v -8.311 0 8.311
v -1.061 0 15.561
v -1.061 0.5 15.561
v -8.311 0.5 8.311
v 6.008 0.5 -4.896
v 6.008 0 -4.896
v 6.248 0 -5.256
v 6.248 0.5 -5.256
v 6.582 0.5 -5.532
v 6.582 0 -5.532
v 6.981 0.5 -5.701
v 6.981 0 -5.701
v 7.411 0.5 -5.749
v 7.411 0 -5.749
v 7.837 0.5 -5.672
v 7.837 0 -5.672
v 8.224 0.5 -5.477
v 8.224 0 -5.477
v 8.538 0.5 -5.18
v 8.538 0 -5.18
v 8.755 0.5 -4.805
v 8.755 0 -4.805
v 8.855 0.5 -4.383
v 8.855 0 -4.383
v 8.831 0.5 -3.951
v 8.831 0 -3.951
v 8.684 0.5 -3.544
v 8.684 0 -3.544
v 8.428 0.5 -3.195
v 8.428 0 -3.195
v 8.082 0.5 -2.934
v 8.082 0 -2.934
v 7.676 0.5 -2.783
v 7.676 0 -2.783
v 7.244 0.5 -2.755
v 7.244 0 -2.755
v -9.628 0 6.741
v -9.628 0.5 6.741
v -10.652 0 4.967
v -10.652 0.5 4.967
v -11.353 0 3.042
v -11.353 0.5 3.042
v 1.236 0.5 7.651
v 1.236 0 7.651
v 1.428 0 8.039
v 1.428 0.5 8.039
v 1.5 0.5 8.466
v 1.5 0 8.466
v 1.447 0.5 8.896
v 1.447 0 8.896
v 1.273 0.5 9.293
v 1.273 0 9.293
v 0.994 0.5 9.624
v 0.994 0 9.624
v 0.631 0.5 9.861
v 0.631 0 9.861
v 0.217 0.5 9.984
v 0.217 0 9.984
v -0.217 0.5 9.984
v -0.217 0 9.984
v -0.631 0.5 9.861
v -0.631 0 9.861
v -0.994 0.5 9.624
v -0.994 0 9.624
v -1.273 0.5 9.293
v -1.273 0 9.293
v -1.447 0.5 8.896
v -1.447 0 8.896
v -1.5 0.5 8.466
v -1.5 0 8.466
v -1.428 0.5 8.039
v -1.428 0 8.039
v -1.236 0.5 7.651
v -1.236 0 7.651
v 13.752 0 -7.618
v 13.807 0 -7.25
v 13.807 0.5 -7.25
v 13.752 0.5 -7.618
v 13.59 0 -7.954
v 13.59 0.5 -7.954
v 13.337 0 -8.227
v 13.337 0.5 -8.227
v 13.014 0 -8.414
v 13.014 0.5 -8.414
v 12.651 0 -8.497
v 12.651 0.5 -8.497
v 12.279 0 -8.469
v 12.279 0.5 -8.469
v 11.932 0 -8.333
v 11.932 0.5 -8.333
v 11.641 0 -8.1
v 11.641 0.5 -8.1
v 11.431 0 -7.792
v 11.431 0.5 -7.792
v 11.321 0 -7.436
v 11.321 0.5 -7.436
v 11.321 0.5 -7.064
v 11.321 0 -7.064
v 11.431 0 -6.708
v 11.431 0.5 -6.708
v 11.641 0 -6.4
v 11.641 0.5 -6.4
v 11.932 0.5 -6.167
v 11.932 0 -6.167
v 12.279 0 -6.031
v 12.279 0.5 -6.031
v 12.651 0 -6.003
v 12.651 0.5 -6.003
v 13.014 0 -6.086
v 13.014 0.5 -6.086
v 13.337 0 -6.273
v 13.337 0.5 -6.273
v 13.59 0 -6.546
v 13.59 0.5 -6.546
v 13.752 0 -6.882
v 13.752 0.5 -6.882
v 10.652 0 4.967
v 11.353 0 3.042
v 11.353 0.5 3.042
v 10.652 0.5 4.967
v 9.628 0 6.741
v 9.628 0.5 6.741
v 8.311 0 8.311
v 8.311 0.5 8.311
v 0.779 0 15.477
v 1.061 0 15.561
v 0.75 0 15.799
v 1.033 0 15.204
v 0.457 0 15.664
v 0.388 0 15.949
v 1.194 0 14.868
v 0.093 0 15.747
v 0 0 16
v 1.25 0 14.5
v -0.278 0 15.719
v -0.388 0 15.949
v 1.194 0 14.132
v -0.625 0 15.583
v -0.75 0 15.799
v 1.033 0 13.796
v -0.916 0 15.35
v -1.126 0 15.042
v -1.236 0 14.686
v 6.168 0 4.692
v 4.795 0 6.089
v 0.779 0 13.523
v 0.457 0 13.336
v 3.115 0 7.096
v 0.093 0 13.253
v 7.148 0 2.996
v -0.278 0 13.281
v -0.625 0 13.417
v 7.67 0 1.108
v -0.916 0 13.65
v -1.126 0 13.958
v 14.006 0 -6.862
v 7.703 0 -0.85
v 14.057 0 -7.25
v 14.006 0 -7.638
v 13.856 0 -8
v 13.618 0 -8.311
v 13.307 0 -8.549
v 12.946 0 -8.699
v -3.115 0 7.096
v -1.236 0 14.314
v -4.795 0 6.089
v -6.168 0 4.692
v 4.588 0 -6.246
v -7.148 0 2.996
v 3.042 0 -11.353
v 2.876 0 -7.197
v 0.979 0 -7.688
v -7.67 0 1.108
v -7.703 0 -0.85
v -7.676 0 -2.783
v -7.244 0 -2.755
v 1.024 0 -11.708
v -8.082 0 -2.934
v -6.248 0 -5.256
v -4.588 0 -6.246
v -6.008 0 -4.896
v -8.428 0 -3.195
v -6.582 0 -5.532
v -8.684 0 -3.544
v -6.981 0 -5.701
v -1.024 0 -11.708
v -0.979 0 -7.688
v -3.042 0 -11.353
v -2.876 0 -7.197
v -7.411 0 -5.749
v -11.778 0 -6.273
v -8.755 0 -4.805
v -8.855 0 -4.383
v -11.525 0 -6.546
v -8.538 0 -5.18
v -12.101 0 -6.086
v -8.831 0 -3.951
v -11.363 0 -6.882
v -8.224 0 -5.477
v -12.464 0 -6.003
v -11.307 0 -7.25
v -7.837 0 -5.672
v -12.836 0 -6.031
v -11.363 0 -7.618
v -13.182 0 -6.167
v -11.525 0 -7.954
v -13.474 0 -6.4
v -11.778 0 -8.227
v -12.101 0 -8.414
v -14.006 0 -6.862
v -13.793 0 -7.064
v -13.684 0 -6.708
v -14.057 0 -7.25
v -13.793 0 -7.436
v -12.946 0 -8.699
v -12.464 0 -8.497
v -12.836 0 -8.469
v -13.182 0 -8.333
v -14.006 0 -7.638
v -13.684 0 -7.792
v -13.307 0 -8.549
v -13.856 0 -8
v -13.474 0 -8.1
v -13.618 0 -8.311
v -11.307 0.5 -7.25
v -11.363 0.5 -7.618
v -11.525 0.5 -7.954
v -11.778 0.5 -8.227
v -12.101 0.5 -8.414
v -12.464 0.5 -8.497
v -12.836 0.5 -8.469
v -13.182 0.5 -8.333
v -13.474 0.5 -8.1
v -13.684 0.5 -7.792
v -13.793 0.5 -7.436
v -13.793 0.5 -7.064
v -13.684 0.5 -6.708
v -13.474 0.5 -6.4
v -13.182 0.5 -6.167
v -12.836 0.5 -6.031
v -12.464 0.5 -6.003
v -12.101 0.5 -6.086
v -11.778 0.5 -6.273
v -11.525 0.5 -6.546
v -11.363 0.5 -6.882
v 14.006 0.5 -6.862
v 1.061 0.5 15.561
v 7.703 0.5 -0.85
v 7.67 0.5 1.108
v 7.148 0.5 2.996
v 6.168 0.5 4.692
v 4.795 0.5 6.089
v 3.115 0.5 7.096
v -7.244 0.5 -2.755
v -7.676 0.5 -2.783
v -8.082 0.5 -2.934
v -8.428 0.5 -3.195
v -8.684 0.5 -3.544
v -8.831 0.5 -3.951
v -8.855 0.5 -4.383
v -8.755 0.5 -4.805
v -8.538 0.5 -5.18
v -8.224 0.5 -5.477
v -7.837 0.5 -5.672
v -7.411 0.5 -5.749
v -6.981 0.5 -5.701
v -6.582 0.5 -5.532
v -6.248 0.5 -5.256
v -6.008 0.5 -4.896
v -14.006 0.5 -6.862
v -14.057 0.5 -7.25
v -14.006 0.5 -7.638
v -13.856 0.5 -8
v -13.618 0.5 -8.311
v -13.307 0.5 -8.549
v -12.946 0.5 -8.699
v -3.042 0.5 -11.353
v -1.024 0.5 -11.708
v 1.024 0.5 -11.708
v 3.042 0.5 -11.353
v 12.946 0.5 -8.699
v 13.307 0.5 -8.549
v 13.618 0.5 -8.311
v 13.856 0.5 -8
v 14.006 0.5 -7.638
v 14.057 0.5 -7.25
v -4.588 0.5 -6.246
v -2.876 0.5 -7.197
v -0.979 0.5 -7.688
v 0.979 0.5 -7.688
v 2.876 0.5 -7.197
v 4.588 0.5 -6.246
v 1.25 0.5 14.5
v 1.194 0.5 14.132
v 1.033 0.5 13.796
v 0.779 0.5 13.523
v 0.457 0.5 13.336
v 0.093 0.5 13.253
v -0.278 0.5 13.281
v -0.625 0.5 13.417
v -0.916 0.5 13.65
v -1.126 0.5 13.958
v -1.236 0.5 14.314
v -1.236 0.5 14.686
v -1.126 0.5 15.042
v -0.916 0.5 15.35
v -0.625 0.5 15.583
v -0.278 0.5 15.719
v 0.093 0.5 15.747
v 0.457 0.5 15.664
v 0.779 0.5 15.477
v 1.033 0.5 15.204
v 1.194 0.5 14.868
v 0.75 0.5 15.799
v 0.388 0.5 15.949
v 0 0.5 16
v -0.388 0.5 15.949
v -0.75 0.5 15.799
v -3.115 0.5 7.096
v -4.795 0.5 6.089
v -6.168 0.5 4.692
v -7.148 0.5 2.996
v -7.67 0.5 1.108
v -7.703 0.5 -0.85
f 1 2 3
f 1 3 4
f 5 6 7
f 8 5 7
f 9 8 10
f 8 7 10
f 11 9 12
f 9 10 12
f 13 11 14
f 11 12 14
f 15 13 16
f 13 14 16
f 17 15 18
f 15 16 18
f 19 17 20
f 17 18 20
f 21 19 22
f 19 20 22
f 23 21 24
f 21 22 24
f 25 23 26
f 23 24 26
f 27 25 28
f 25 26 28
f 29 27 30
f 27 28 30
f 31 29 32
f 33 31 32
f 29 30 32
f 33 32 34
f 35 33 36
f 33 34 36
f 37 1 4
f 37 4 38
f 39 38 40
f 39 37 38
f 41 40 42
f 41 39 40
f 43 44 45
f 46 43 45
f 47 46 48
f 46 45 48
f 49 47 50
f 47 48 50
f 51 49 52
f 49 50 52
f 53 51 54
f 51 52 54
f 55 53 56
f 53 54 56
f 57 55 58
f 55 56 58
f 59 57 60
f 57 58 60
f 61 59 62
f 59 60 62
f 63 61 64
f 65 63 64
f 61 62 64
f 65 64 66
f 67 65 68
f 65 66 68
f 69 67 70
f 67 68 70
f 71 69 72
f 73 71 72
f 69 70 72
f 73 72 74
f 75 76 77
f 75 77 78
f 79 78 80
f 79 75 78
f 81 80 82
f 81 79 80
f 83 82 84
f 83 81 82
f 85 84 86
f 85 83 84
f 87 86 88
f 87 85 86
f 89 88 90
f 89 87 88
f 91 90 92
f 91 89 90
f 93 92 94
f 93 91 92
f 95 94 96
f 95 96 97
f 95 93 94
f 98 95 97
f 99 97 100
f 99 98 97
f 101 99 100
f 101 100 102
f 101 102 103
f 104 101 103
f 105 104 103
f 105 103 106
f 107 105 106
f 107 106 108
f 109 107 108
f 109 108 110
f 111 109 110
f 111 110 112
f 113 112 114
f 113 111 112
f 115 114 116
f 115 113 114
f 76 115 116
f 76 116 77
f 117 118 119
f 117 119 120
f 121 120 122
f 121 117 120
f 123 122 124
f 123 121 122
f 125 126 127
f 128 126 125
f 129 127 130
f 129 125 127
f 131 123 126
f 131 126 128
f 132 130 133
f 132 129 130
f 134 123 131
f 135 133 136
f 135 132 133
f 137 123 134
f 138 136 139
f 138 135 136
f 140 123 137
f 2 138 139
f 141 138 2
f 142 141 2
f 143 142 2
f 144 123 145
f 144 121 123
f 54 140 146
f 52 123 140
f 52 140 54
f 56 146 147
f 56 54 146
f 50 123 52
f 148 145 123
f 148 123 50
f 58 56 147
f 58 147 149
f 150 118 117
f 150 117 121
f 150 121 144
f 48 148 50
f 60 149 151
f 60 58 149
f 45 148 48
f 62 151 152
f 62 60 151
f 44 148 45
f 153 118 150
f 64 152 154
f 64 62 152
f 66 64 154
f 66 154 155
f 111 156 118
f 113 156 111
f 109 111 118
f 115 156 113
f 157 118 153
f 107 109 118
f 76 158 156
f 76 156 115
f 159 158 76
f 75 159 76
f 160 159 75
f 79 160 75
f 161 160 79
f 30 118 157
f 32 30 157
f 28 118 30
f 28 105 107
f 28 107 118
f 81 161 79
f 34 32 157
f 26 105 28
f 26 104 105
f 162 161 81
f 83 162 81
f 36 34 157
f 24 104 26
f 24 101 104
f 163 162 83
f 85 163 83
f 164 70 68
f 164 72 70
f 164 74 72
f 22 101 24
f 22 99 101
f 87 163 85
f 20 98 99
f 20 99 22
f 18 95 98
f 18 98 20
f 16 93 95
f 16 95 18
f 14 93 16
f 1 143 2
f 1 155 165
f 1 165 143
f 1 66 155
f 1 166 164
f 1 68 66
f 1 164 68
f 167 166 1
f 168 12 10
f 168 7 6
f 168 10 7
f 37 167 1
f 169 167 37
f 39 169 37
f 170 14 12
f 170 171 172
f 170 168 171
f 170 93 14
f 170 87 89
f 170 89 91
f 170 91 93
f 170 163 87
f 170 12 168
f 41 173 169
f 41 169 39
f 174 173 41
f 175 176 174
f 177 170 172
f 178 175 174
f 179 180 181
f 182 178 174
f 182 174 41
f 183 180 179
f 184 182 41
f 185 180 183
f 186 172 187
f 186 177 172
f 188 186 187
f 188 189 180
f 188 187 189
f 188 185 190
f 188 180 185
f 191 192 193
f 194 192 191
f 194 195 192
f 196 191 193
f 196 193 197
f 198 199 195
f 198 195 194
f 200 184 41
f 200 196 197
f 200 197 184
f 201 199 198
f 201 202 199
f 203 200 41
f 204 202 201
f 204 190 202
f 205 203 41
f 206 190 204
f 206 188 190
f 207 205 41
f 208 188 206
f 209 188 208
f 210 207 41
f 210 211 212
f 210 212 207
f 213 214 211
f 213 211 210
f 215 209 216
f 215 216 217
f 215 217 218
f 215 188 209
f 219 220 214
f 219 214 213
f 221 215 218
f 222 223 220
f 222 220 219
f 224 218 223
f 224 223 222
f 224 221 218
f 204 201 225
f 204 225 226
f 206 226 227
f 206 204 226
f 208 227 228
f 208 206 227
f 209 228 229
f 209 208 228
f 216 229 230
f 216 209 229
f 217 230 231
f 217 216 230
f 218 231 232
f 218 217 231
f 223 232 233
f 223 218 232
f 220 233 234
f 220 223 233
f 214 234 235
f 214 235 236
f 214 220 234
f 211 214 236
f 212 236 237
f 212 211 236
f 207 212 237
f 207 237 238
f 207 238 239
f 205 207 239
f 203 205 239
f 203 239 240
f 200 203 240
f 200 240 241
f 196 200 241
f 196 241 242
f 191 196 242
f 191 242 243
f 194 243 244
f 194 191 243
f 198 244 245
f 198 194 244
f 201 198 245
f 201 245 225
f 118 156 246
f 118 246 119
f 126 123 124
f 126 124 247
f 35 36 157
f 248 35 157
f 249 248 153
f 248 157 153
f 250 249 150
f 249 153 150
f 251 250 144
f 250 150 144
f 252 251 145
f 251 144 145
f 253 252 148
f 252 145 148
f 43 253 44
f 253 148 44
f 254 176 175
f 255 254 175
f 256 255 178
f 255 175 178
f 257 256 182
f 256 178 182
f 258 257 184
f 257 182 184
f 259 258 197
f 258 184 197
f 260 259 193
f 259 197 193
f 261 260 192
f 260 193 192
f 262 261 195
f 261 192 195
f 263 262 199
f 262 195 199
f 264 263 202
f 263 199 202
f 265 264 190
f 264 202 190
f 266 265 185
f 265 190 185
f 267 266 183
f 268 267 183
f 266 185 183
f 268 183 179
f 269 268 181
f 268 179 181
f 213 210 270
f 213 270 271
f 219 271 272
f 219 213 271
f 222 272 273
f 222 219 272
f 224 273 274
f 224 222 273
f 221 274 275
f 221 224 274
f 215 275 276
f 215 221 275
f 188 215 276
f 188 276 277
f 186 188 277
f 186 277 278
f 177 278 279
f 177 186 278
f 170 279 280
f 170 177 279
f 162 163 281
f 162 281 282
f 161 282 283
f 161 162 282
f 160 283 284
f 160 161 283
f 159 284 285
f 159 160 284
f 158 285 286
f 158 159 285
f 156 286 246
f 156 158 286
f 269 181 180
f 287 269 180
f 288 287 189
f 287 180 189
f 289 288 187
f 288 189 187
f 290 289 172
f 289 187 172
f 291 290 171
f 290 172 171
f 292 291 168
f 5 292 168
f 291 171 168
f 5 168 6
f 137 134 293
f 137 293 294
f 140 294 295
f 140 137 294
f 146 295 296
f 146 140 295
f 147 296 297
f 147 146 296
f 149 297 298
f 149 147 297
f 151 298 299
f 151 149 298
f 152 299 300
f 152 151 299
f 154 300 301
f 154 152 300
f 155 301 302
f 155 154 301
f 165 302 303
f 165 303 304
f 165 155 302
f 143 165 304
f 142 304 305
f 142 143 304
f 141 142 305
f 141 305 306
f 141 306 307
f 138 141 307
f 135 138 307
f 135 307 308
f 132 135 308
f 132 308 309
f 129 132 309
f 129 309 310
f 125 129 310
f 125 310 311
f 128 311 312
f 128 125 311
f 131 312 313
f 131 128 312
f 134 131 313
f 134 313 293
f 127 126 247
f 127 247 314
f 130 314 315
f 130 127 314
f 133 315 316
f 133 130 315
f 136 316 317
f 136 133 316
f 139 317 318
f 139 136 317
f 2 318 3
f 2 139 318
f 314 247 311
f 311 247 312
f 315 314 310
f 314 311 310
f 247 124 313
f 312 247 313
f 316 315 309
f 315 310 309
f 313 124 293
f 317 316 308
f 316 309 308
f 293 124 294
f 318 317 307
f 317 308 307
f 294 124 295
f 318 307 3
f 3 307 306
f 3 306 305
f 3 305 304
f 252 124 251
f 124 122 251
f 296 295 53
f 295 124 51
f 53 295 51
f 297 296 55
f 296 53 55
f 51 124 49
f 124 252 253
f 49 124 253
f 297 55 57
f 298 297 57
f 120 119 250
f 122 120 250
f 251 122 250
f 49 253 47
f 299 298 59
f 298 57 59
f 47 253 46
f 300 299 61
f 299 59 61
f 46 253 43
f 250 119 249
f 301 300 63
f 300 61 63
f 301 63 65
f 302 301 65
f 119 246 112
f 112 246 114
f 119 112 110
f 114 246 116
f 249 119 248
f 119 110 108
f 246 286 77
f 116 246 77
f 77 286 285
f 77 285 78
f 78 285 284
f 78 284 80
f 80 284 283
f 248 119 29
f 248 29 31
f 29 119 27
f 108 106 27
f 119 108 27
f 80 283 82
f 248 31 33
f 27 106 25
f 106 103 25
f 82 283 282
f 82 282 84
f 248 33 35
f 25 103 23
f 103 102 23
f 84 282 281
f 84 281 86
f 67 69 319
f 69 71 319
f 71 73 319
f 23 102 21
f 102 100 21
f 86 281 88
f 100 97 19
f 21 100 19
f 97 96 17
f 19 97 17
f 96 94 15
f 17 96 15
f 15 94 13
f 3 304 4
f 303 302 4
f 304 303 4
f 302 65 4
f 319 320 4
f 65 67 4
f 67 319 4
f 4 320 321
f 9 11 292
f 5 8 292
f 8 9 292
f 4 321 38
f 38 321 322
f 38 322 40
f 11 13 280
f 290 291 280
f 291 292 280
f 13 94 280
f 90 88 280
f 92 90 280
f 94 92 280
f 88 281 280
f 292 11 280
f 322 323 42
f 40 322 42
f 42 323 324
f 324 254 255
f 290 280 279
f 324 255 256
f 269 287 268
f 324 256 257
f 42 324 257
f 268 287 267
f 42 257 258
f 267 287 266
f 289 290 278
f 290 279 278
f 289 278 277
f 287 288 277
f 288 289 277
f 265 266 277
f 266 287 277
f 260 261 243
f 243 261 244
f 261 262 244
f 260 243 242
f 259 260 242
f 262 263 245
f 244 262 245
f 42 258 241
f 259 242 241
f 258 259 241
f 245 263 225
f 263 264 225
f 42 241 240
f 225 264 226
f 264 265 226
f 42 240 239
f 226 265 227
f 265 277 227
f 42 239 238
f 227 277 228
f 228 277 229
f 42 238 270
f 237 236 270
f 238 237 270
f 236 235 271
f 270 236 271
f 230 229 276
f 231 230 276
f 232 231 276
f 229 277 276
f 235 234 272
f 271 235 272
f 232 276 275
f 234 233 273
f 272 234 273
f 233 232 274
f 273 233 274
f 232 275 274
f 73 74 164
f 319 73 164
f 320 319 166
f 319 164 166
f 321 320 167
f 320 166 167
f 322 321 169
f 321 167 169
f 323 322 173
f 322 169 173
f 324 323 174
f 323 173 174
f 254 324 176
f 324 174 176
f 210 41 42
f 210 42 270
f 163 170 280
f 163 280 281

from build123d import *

# Parameters (mm, degrees)
ESQUISSE1_R      = 1.25
EXTRUSION1_DEPTH = 0.5


with BuildPart() as part:
    # Esquisse1 → Extrusion1 (new body)
    with BuildSketch(Plane(origin=(0, 0, 0), x_dir=(1, 0, 0), z_dir=(0, 1, 0))):
        with BuildLine():
            Line((-11.352572917, -3.041912745), (-14.006257094, 6.861771432))
            ThreePointArc((-14.006257094, 6.861771432), (-13.856406461, 8), (-12.945596923, 8.698888739))
            Line((-12.945596923, 8.698888739), (-3.041912745, 11.352572917))
            ThreePointArc((-3.041912745, 11.352572917), (0, 11.753048327), (3.041912745, 11.352572917))
            Line((3.041912745, 11.352572917), (12.945596923, 8.698888739))
            ThreePointArc((12.945596923, 8.698888739), (13.856406461, 8), (14.006257094, 6.861771432))
            Line((14.006257094, 6.861771432), (11.352572917, -3.041912745))
            ThreePointArc((11.352572917, -3.041912745), (10.178438423, -5.876524164), (8.310660172, -8.310660172))
            Line((8.310660172, -8.310660172), (1.060660172, -15.560660172))
            ThreePointArc((1.060660172, -15.560660172), (0, -16), (-1.060660172, -15.560660172))
            Line((-1.060660172, -15.560660172), (-8.310660172, -8.310660172))
            ThreePointArc((-8.310660172, -8.310660172), (-10.178438423, -5.876524164), (-11.352572917, -3.041912745))
        make_face()
        with Locations((-12.557368355, 7.25)):
            Circle(ESQUISSE1_R, mode=Mode.SUBTRACT)
        with Locations((12.557368355, 7.25)):
            Circle(ESQUISSE1_R, mode=Mode.SUBTRACT)
        with Locations((0, -14.5)):
            Circle(ESQUISSE1_R, mode=Mode.SUBTRACT)
        with BuildLine():
            ThreePointArc((-7.243944164, 2.754591249), (-8.660254038, 5), (-6.007518081, 4.896144045))
            ThreePointArc((-6.007518081, 4.896144045), (0, 7.75), (6.007518081, 4.896144045))
            ThreePointArc((6.007518081, 4.896144045), (8.660254038, 5), (7.243944164, 2.754591249))
            ThreePointArc((7.243944164, 2.754591249), (6.711696879, -3.875), (1.236426083, -7.650735294))
            ThreePointArc((1.236426083, -7.650735294), (0, -10), (-1.236426083, -7.650735294))
            ThreePointArc((-1.236426083, -7.650735294), (-6.711696879, -3.875), (-7.243944164, 2.754591249))
        make_face(mode=Mode.SUBTRACT)
    extrude(amount=EXTRUSION1_DEPTH)


solid = part.part
